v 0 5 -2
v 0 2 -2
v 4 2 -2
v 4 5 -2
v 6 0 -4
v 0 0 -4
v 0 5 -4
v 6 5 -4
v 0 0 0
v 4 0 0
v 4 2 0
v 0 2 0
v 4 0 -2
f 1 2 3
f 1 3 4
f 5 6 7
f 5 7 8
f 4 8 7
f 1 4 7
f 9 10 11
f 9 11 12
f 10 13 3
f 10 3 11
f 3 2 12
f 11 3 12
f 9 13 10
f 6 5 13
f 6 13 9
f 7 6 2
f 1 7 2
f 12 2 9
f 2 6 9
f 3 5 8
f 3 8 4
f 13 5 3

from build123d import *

# Parameters (mm, degrees)
BOSS_EXTRUDE1_DEPTH = 5
SKETCH4_W           = 2
SKETCH4_H           = 3
CUT_EXTRUDE3_DEPTH  = 15


with BuildPart() as part:
    # Sketch1 → Boss-Extrude1 (new body)
    with BuildSketch(Plane(origin=(0, 0, 0), x_dir=(1, 0, 0), z_dir=(0, 1, 0))):
        Polygon((4, 2), (4, 0), (0, 0), (0, 2), (0, 4), (6, 4), align=None)
    extrude(amount=BOSS_EXTRUDE1_DEPTH)

    # Sketch4 → Cut-Extrude3 (cut)
    with BuildSketch(Plane.ZY):
        with Locations((-1, 3.5)):
            Rectangle(SKETCH4_W, SKETCH4_H)
    extrude(amount=-CUT_EXTRUDE3_DEPTH, mode=Mode.SUBTRACT)


solid = part.part
